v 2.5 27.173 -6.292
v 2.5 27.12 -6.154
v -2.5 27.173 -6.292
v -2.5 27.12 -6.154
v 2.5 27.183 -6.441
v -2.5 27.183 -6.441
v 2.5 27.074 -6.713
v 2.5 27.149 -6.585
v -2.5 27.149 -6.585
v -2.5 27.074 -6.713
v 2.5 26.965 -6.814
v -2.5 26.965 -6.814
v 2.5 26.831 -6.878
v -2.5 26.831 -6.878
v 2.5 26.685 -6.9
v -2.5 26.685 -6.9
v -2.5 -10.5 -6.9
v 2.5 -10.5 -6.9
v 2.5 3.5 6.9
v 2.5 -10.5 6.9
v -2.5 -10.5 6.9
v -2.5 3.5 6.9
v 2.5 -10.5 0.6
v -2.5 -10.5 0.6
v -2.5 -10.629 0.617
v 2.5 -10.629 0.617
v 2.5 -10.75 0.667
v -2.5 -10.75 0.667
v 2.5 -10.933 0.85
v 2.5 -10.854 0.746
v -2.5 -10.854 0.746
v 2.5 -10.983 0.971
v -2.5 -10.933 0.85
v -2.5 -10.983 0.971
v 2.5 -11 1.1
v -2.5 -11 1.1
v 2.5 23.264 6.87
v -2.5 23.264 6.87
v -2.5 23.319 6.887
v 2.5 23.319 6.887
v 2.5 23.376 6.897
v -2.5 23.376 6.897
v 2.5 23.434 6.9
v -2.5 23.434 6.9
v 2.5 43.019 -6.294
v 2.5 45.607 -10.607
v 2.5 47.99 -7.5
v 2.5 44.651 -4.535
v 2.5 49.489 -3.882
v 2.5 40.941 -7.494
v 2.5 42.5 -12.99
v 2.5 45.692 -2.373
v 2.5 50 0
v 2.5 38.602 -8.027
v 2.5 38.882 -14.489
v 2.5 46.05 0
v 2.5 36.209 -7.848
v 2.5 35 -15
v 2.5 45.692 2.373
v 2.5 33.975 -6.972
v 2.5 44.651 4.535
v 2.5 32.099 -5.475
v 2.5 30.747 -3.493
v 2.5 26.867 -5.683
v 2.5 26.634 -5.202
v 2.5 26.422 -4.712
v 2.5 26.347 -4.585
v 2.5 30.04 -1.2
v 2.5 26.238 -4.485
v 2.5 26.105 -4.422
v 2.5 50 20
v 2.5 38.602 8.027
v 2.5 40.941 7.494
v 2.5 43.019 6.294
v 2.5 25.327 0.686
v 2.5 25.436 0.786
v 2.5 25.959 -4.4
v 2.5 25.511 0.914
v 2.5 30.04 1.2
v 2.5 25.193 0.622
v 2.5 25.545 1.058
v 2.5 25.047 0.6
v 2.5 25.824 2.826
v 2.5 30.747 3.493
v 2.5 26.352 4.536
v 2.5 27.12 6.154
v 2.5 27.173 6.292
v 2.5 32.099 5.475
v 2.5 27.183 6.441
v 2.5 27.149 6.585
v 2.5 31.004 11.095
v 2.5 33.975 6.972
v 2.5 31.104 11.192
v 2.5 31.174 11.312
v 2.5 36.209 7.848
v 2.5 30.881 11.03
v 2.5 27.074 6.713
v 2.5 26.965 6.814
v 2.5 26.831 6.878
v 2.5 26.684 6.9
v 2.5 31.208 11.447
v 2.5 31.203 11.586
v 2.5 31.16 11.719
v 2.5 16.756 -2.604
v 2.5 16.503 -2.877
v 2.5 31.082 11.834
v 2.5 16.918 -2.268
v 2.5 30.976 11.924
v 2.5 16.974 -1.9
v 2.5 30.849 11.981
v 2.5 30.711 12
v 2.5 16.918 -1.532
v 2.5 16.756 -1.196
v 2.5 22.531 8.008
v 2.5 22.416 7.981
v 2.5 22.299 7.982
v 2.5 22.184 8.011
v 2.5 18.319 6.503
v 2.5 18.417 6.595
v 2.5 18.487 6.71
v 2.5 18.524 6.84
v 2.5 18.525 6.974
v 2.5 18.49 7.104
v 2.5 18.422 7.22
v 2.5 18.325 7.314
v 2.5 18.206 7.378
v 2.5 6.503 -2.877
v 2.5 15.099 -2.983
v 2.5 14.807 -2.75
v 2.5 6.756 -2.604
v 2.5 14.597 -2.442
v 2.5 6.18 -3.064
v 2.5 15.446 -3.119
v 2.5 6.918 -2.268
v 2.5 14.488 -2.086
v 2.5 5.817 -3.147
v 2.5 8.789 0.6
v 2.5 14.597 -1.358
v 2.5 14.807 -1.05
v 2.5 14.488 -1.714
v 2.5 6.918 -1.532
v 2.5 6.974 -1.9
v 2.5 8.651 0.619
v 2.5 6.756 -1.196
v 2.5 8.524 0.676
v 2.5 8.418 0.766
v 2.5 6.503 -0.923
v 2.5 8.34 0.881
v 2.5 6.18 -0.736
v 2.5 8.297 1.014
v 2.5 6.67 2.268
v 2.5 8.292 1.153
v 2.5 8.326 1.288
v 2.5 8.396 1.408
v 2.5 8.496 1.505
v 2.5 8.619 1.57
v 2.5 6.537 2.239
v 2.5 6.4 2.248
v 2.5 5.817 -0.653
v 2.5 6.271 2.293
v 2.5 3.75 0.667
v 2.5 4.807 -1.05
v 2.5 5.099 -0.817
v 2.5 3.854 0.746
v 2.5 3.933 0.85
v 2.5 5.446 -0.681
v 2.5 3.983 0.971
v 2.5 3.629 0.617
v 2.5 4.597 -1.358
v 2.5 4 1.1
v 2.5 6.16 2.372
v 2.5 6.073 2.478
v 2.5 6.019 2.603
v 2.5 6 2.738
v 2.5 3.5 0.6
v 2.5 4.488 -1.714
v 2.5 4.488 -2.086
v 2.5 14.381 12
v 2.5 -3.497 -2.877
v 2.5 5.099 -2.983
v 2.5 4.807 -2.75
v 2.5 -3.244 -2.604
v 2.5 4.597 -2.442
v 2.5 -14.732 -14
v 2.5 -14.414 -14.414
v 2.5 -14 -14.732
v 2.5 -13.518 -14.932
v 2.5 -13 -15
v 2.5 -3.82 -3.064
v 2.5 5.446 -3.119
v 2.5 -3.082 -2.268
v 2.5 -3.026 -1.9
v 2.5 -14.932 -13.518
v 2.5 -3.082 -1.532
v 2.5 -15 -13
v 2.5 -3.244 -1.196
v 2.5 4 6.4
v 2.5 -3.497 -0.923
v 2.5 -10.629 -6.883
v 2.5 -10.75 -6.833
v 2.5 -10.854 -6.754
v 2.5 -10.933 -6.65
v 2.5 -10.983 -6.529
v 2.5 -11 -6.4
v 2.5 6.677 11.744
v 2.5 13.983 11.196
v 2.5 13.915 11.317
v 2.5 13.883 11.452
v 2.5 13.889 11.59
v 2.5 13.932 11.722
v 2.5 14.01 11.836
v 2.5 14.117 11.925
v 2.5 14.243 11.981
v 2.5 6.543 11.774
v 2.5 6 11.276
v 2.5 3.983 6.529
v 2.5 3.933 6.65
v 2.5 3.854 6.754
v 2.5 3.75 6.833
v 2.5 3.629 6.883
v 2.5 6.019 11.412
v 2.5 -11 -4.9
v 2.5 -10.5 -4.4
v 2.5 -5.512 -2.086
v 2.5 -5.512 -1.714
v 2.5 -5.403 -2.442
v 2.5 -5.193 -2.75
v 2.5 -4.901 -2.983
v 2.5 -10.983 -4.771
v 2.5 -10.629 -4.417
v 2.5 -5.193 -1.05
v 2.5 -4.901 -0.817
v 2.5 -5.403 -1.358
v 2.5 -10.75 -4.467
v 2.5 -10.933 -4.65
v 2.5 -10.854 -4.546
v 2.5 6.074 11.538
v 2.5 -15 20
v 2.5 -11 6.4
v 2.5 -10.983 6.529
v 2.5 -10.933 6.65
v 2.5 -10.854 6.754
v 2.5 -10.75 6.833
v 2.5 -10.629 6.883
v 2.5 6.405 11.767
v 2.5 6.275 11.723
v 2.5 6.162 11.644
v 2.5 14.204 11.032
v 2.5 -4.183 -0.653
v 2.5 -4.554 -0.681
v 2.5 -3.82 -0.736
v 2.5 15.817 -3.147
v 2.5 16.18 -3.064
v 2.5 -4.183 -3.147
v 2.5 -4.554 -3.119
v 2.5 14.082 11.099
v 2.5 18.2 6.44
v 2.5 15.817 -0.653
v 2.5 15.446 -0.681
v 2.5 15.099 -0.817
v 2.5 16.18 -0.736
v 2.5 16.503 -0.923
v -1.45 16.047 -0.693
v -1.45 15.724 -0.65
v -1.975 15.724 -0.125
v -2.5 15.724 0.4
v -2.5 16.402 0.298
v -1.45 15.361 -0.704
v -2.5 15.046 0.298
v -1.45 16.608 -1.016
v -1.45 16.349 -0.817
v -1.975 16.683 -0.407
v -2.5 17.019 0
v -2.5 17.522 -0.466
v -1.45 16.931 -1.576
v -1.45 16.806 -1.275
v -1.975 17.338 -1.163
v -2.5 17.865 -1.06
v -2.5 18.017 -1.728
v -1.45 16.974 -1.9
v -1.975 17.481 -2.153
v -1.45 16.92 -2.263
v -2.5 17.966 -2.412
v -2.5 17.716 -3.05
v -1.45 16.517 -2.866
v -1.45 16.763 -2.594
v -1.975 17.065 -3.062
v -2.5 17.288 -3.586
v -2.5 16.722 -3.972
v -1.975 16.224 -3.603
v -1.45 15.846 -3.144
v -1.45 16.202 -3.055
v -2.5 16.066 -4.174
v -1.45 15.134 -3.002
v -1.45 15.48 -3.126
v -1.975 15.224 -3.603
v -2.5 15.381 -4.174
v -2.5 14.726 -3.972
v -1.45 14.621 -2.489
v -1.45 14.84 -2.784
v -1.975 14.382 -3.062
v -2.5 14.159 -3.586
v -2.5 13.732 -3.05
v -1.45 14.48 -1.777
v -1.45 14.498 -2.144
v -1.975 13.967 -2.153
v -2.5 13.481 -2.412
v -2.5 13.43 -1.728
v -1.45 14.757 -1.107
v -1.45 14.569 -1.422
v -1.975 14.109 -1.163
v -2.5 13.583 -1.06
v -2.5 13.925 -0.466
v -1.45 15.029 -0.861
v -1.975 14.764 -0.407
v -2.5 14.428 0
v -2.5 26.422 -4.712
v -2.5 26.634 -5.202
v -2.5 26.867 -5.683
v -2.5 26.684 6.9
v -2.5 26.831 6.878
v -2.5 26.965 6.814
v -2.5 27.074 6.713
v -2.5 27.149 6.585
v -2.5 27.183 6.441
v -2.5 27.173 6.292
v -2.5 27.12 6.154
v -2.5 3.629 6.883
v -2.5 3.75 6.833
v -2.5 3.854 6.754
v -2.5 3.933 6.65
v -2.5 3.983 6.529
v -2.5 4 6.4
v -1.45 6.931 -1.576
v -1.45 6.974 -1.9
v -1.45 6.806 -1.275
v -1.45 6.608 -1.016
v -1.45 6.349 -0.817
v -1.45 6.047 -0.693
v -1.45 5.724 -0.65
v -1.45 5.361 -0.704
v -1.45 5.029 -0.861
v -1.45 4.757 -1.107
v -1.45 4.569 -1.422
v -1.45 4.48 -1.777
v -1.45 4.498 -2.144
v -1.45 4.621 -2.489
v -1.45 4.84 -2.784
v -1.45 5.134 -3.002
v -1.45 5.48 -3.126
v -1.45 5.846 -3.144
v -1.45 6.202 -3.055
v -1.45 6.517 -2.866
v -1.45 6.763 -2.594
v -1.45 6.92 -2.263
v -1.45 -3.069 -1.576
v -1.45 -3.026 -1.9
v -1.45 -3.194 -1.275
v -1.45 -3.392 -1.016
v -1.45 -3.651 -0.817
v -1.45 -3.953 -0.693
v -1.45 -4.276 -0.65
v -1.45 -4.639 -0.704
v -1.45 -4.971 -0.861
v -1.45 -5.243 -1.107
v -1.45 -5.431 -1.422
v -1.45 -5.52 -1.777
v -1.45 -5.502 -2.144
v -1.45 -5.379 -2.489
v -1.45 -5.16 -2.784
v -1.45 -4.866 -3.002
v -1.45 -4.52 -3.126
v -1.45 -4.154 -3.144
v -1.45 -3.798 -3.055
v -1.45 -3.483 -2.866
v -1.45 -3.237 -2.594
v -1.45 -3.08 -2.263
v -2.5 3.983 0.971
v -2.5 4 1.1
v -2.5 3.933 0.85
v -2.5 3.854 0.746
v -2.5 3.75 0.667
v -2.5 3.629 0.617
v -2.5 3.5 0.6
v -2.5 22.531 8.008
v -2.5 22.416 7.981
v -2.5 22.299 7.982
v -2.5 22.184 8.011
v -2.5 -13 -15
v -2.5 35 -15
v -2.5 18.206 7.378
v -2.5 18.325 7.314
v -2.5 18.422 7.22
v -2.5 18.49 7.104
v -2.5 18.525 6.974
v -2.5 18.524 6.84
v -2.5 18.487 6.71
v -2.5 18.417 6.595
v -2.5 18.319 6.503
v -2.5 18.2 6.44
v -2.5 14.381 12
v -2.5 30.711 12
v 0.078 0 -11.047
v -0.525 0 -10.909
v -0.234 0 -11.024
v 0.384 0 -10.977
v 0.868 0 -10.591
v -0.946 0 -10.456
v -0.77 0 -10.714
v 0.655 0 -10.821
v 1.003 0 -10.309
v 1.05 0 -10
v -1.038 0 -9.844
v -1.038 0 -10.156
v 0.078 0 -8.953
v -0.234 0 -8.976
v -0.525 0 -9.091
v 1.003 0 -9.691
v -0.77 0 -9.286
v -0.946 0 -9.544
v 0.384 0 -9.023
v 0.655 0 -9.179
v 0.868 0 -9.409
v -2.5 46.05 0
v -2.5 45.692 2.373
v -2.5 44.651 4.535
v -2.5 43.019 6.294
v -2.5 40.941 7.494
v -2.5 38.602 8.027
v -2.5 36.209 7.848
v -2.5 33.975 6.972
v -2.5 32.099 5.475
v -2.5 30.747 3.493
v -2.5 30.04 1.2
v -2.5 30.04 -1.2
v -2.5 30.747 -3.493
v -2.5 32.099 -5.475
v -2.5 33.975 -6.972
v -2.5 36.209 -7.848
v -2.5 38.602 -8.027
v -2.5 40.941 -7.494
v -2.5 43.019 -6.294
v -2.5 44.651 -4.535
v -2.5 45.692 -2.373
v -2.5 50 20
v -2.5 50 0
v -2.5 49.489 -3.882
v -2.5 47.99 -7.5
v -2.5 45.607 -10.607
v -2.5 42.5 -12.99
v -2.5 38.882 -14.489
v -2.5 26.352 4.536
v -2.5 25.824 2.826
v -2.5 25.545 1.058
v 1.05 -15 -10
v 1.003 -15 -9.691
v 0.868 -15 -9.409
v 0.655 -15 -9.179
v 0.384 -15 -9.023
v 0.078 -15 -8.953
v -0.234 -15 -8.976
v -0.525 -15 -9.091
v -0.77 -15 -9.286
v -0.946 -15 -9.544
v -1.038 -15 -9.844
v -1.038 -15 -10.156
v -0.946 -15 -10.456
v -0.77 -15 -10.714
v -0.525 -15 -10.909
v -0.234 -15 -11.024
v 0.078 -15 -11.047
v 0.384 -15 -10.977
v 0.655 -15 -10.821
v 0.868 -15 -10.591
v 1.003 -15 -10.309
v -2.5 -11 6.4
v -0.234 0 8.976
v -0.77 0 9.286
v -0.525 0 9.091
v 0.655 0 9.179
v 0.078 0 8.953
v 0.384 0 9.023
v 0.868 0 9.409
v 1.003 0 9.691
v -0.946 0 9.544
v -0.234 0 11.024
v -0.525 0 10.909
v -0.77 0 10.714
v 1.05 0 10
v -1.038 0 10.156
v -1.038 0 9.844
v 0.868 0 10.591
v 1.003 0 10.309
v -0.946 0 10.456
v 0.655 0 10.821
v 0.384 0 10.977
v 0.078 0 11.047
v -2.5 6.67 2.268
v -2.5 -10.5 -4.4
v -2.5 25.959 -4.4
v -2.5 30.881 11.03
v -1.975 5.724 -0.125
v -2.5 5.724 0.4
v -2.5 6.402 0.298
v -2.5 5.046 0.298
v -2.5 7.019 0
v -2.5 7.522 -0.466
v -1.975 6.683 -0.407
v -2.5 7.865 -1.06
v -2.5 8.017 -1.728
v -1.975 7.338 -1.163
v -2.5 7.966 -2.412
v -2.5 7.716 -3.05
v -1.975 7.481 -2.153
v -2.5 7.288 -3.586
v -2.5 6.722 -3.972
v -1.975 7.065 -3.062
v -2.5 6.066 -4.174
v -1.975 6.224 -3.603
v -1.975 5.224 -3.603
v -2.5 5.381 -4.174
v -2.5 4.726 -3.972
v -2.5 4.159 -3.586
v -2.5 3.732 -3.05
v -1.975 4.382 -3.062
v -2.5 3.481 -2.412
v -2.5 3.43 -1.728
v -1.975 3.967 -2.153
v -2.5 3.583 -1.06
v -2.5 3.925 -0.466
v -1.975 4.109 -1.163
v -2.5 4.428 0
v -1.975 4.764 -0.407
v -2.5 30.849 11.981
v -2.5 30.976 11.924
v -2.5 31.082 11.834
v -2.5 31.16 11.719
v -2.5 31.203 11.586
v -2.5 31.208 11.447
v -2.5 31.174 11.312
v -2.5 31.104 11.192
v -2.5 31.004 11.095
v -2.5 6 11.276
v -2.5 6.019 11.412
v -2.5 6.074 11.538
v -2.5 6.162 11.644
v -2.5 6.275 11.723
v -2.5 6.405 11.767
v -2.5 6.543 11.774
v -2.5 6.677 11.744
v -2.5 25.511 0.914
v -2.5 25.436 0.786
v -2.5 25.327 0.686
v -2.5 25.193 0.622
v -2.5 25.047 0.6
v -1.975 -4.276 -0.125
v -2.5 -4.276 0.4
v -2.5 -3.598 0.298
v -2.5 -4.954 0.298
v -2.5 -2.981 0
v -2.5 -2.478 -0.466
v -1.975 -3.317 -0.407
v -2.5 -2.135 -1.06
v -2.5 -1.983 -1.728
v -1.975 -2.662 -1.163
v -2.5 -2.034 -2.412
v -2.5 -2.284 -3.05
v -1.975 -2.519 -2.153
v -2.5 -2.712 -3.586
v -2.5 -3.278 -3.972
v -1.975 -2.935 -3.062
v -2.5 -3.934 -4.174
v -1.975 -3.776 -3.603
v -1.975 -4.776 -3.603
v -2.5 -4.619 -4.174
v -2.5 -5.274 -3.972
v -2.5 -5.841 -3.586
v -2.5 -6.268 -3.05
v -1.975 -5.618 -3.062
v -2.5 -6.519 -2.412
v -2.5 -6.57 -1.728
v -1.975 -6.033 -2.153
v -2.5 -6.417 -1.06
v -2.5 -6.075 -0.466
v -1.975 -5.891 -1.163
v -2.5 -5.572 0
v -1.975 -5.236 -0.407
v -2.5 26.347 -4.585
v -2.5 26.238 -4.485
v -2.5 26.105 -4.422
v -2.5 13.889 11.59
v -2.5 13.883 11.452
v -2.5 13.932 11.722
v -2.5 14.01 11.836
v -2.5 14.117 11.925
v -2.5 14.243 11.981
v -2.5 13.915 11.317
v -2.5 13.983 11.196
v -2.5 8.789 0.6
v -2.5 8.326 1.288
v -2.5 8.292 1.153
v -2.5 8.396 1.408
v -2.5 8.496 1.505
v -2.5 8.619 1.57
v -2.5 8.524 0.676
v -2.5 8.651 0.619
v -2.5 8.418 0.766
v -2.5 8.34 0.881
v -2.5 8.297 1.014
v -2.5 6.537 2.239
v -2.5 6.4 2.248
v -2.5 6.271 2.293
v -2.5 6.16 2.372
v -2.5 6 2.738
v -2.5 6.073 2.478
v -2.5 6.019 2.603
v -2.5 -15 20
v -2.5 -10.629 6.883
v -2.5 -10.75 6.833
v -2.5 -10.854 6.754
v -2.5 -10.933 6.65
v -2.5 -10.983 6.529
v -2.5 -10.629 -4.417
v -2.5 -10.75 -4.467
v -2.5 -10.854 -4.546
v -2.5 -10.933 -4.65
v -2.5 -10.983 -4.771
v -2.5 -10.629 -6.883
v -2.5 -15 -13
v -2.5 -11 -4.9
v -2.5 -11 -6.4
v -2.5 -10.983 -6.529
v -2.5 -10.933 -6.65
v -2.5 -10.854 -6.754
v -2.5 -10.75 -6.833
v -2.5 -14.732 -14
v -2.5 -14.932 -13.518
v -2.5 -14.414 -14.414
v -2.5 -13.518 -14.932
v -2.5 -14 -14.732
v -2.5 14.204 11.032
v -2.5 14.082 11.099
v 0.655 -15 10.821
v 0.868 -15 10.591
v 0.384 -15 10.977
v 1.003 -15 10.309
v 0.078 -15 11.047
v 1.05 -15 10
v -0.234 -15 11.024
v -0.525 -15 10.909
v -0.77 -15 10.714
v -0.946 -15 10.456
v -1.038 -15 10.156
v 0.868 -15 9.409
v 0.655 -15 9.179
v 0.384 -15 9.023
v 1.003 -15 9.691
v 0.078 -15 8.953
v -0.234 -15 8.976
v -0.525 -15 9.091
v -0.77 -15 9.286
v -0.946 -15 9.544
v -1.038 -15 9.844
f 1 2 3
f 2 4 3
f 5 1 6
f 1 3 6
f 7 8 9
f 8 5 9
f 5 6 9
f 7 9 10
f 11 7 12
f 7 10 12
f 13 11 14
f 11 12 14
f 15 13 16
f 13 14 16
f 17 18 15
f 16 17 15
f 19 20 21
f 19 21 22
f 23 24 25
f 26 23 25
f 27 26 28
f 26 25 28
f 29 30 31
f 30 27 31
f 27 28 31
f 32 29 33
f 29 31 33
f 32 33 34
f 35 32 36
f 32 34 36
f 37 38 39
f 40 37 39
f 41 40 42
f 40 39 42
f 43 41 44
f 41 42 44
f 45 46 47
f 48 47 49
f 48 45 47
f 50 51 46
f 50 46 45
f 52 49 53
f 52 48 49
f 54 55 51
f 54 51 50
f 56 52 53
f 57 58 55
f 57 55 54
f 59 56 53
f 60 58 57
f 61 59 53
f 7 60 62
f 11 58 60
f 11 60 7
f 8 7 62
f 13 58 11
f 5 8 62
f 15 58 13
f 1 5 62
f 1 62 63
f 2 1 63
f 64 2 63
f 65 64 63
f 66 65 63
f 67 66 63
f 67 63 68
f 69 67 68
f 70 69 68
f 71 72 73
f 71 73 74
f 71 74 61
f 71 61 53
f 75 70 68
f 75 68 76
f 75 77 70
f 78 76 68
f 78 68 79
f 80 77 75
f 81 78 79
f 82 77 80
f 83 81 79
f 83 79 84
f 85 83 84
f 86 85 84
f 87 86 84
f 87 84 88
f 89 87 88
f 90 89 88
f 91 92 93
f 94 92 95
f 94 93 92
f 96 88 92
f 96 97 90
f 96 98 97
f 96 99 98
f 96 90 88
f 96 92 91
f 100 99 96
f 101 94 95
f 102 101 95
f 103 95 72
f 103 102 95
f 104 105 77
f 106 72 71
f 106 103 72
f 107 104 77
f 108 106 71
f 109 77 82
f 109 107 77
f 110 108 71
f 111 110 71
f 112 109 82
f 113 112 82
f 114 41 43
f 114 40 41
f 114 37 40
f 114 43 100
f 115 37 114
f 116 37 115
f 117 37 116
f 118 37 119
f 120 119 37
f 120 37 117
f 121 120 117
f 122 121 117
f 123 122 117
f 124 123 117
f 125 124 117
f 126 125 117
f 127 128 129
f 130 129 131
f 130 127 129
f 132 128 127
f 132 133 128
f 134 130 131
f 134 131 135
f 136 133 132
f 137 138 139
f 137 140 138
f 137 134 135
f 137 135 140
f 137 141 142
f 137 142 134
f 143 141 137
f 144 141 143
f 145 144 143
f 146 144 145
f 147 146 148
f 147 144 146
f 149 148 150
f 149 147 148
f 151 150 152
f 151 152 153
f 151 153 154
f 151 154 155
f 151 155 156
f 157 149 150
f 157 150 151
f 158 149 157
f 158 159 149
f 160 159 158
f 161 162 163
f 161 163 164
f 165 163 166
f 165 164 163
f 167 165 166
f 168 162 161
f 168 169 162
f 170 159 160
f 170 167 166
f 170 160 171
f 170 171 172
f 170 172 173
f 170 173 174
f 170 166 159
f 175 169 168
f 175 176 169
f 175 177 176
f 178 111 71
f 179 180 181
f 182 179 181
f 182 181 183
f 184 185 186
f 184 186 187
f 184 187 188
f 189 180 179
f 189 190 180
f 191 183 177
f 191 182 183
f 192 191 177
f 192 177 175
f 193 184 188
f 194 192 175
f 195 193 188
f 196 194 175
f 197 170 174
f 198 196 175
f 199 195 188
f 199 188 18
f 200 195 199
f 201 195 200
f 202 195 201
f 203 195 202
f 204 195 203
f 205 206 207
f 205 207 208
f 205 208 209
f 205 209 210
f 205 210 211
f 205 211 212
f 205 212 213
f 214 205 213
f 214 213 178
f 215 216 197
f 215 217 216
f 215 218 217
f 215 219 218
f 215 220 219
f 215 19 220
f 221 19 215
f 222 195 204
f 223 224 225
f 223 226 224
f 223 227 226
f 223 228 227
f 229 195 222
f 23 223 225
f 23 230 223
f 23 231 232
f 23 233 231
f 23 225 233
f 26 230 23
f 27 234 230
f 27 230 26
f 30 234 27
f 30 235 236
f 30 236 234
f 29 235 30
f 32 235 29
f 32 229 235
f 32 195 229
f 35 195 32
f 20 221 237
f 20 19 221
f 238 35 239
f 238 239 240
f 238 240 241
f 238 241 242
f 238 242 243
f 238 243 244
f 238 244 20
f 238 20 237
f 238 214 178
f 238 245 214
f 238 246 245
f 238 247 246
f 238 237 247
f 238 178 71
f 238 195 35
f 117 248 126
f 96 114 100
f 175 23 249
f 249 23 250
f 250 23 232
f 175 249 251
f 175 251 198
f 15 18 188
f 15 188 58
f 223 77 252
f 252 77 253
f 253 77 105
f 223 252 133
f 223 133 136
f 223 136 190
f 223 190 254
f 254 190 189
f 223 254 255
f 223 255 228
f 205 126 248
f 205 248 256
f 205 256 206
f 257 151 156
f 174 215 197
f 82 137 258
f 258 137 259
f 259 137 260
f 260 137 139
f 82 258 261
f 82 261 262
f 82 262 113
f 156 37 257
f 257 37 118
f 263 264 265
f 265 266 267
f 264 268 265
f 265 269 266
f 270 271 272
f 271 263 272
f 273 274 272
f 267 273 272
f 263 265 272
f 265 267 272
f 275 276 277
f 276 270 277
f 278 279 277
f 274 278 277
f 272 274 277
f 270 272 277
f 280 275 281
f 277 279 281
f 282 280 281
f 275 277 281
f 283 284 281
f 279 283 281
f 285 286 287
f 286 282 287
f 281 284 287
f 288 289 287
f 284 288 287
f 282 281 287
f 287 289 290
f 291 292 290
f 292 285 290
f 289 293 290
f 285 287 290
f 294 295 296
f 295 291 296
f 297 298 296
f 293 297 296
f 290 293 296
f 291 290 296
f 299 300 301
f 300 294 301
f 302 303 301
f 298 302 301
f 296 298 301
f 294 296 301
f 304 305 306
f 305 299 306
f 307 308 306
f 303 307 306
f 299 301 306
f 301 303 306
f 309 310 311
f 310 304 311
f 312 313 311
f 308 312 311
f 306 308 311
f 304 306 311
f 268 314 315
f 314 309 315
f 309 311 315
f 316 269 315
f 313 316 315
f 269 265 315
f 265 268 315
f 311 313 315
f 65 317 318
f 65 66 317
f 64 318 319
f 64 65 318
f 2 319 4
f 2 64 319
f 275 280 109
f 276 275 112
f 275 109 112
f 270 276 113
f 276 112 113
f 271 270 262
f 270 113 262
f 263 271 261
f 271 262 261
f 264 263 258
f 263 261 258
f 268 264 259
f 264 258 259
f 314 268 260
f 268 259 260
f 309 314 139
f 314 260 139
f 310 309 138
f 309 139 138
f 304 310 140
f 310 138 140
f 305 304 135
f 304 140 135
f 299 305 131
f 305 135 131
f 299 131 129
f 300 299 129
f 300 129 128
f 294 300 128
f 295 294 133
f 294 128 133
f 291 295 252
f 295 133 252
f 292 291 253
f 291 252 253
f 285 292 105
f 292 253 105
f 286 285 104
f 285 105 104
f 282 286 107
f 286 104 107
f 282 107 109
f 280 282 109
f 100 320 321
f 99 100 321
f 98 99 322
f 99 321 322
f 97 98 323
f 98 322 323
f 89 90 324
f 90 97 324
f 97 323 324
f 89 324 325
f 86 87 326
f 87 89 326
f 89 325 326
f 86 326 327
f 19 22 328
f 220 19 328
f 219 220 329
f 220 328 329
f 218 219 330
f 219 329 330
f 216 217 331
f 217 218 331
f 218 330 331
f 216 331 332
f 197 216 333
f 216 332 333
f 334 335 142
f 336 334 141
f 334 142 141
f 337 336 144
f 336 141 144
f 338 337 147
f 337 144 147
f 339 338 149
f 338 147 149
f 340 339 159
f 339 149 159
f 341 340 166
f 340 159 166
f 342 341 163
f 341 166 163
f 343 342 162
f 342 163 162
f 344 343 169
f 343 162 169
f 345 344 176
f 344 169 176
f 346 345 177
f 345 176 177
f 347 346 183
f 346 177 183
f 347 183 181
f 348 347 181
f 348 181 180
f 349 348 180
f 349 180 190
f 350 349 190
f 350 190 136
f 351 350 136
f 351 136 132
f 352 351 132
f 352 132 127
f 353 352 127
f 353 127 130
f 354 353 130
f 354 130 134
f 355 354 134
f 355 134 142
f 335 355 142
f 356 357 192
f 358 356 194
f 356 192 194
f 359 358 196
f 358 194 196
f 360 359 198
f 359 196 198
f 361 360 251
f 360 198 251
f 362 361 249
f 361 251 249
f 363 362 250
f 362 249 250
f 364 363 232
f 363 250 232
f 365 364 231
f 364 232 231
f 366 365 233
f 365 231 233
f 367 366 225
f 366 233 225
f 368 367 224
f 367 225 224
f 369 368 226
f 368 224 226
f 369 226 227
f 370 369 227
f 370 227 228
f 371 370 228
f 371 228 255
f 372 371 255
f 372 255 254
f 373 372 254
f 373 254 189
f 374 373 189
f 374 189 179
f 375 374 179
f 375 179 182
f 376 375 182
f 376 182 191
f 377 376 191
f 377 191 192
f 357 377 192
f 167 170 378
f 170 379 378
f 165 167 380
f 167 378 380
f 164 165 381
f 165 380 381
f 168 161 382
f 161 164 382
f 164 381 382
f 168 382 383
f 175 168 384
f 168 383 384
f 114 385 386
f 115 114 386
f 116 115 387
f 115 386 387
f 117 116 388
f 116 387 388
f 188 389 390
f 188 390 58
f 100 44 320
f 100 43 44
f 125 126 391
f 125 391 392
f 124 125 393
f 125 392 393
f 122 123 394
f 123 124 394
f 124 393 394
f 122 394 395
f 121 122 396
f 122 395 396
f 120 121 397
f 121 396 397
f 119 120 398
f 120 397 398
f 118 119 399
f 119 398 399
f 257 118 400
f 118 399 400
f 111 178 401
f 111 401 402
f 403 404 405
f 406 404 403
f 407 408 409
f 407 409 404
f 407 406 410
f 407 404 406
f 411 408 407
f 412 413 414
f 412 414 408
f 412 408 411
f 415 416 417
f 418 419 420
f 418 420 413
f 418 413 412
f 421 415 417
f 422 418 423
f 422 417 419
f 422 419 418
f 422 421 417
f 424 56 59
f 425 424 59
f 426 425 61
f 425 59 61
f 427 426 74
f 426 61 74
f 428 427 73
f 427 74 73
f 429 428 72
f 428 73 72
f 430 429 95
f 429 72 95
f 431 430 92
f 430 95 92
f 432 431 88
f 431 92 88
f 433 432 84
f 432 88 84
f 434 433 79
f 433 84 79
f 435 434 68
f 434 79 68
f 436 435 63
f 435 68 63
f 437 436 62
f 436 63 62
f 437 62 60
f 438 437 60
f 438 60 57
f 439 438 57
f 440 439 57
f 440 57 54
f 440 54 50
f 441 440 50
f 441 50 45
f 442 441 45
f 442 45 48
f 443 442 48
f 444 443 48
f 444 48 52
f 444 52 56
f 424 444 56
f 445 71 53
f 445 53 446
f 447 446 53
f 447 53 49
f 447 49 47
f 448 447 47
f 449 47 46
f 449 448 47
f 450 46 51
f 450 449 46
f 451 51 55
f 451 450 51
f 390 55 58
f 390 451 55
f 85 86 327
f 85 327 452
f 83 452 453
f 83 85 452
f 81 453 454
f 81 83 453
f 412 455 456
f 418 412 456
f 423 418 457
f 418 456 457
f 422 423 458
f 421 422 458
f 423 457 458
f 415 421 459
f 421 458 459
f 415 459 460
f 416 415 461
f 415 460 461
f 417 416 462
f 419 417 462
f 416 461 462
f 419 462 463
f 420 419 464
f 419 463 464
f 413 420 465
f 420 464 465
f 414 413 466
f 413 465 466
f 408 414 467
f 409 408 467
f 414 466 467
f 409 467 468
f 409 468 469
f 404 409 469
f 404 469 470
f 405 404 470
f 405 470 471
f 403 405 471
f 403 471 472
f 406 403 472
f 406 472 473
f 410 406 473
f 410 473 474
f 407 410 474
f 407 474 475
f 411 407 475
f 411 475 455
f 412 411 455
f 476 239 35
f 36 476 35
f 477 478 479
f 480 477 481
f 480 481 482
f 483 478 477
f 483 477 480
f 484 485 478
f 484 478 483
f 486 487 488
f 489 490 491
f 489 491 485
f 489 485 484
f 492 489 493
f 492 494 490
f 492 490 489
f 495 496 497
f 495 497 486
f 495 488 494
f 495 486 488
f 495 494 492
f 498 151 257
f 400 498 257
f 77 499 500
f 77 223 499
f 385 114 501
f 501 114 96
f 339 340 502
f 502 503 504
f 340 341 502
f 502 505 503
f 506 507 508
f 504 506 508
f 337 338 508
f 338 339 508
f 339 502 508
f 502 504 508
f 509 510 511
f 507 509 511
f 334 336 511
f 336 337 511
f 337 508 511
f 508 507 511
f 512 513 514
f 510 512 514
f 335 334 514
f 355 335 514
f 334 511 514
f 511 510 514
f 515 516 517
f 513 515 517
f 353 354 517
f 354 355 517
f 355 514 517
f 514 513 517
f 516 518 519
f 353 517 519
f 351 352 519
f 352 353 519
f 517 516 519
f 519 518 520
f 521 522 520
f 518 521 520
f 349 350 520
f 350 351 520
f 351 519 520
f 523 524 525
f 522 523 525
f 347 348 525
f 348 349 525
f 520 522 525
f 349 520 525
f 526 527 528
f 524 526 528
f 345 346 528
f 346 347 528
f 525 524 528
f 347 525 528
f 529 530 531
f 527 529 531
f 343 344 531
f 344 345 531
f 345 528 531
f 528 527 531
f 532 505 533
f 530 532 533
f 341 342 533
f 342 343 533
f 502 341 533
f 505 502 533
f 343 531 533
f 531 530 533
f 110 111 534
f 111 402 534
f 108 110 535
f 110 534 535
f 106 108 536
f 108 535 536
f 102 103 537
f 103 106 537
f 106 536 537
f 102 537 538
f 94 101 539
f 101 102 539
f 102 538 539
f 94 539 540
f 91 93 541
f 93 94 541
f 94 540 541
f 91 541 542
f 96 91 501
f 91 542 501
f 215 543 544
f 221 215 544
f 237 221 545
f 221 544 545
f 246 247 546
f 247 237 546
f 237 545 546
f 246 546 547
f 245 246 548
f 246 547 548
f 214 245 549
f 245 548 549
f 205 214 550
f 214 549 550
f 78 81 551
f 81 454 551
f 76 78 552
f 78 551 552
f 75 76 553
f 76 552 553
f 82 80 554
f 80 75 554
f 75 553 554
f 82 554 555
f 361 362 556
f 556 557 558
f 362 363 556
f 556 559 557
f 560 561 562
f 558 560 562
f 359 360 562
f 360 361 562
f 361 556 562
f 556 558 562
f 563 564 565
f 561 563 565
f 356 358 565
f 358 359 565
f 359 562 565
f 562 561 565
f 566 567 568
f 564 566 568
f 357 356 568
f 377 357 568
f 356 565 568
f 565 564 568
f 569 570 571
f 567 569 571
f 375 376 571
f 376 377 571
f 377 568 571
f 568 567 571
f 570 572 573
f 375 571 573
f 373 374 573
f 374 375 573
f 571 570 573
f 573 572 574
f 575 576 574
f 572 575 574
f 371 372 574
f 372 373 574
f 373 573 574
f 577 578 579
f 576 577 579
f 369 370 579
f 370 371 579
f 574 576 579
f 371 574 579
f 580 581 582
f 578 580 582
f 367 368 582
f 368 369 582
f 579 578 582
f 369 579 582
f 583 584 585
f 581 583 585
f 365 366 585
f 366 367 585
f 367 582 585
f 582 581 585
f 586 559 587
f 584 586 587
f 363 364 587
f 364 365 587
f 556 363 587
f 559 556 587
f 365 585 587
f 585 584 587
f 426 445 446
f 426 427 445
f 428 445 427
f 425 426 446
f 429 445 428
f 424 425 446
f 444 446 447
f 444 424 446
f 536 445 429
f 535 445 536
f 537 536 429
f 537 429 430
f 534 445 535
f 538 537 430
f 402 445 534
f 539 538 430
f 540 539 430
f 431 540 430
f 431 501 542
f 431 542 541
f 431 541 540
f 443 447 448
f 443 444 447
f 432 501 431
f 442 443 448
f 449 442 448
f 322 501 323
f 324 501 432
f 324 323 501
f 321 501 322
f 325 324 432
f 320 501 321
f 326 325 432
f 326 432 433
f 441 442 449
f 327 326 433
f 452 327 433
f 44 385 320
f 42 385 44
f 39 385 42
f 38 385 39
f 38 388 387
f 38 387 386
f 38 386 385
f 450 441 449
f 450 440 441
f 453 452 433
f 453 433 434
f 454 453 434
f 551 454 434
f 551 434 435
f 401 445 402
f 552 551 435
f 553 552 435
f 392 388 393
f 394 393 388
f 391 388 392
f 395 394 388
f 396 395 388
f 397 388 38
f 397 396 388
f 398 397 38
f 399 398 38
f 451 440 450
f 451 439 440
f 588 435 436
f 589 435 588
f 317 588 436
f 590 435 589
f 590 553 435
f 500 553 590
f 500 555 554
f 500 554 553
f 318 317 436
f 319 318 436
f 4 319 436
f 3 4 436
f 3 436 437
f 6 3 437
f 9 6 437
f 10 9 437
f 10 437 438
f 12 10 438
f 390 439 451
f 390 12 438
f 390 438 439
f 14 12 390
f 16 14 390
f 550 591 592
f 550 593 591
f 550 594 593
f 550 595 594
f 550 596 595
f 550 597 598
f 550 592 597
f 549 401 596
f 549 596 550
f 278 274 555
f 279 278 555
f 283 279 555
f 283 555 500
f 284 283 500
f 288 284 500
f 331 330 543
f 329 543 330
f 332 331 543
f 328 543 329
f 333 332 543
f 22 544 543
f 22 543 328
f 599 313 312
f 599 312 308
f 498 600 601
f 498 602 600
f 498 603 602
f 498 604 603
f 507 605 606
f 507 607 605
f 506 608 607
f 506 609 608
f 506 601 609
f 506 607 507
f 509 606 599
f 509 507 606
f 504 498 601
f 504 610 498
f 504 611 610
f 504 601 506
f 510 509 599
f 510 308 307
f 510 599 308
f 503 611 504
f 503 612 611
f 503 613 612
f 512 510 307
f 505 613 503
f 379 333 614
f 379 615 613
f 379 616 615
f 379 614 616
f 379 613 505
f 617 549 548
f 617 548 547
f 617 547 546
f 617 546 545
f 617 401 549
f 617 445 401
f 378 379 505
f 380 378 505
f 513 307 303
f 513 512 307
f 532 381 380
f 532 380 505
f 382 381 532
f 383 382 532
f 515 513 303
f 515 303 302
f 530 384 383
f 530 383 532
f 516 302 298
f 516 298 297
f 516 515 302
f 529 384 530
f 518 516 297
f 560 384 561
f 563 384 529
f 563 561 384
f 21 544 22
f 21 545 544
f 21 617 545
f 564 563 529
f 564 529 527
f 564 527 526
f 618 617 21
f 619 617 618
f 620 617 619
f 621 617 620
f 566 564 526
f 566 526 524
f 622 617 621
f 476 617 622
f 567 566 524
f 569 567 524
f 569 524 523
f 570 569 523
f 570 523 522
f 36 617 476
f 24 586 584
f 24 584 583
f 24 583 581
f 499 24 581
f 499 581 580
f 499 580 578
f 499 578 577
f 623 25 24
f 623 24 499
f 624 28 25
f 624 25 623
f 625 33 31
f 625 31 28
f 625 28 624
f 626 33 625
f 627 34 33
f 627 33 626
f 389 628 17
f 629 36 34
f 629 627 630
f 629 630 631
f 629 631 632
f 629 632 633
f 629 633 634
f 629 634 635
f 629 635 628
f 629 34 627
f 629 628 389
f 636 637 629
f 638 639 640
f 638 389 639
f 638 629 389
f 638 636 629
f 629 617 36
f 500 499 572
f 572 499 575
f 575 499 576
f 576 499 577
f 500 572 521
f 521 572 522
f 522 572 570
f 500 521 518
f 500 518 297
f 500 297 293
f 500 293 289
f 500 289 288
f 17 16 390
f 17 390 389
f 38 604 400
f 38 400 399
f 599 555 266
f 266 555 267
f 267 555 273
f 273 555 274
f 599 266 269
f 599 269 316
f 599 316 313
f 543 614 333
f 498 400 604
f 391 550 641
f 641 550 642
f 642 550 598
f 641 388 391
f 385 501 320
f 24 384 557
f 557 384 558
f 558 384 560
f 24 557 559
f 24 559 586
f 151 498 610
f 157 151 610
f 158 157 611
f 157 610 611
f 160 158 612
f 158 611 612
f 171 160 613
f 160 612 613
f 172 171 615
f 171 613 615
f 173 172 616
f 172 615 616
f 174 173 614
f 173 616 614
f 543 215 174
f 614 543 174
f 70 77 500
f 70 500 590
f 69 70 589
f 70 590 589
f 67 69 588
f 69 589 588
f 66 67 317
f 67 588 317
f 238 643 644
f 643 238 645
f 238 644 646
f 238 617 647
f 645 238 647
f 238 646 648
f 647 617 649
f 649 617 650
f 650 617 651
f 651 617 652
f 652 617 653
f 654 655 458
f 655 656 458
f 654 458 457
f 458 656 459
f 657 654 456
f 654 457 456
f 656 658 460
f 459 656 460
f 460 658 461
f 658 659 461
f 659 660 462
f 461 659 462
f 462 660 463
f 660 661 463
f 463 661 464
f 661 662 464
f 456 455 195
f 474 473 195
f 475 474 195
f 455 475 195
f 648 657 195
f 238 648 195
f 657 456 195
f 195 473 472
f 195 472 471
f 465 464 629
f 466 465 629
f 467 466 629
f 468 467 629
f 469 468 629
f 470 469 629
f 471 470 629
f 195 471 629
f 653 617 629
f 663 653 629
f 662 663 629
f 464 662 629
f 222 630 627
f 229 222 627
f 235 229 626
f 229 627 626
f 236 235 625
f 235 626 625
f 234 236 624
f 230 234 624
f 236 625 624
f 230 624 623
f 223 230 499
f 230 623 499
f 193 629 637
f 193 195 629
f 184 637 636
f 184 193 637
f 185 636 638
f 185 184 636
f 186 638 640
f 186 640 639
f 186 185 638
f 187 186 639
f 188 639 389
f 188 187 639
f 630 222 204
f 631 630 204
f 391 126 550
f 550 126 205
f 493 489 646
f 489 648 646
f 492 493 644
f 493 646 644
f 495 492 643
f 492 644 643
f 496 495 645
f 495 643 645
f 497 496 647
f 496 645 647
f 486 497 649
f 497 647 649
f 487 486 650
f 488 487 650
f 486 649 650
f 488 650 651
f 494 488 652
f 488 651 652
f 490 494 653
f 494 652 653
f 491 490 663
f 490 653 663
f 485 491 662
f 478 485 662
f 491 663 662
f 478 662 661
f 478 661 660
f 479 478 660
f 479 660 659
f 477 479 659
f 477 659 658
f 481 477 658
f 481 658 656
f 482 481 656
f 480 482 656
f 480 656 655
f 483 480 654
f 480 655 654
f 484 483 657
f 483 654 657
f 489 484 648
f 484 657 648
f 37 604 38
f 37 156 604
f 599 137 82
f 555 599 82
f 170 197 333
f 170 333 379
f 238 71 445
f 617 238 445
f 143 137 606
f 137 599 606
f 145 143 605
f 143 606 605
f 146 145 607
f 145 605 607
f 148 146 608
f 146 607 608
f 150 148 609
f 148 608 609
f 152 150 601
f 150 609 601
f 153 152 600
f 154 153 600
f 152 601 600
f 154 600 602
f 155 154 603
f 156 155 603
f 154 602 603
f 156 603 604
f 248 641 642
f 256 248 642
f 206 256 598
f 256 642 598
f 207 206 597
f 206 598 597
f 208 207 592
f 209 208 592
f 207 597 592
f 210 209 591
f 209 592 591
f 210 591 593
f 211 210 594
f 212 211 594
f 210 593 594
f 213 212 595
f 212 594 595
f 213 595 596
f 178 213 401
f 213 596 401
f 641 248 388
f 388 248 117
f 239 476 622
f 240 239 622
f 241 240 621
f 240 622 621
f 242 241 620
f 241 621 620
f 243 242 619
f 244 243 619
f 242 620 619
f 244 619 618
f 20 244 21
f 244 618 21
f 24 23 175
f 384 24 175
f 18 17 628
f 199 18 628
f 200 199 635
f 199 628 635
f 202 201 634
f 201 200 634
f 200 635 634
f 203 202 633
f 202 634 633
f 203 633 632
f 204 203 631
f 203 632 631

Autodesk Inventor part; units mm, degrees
ref_plane "YZ Plane" through (0, 0, 0) normal (1, 0, 0) x (0, 1, 0)
ref_plane "XZ Plane" through (0, 0, 0) normal (0, 1, 0) x (-1, 0, 0)
ref_plane "XY Plane" through (0, 0, 0) normal (0, 0, 1) x (1, 0, 0)
sketch "Boceto1" plane through (0, 0, 0) normal (0, 1, 0) x (-1, 0, 0)
  line L0 (-2.5, 20) -> (2.5, 20)
  line L1 (2.5, 20) -> (2.5, -15)
  line L2 (2.5, -15) -> (-2.5, -15)
  line L3 (-2.5, -15) -> (-2.5, 20)
  line L4 (0, 20) -> (0, -15)
  line L5 (-2.5, 2.5) -> (2.5, 2.5)
  point P0 (0, 0)
  point P1 (0, 2.5)
  dimension "d0" = 5
  dimension "d1" = 35
  dimension "d26" = 20
extrude "Main Body" add sketch "Boceto1" along normal mid plane 100
sketch "Axles" plane through (0, 0, 0) normal (1, 0, 0) x (0, 1, 0)
  line L0 (50, 20) -> (-50, 20) projected
  circle A0 centre (38, 0) radius 8.05
  circle A1 centre (-40, 0) radius 6.5
  point P0 (0, 0)
  dimension "d53" = 5
  dimension "d55" = 13
  dimension "d11" = 20
  dimension "d12" = 40
  dimension "d13" = 38
  dimension "d14" = 20
  dimension "d22" = 16.1
  dimension "d23" = 13
extrude "Bearings" cut sketch "Axles" along normal mid plane 100
sketch "Boceto4" plane through (0, 0, 0) normal (1, 0, 0) x (0, 1, 0)
  line L0 (-50.2028, -2.5) -> (5.4434, -2.5)
  line L1 (-50, -15) -> (-50, 20) projected
  line L2 (-50, 7.0921) -> (-15, 7.0921)
  line L3 (-15, 7.0921) -> (-15, -12.9079)
  line L4 (-15, -12.9079) -> (-50, -12.9079)
  line L5 (-50, -12.9079) -> (-50, 7.0921)
  point P0 (0, 0)
  dimension "d27" = 20
  dimension "d28" = 35
sketch "Boceto5" plane through (0, 0, 0) normal (1, 0, 0) x (0, 1, 0)
  line L0 (-50, 25.8088) -> (-15, 25.8088)
  line L1 (-15, 25.8088) -> (-15, -24.1912)
  line L2 (-15, -24.1912) -> (-50, -24.1912)
  line L3 (-50, -24.1912) -> (-50, 25.8088)
  point P0 (0, 0)
  point P1 (-50, 20)
  dimension "d29" = 35
  dimension "d56" = 50
extrude "Spring_support_space" cut sketch "Boceto5" along normal mid plane 10
sketch "Boceto6" plane through (-2.5, -15, 20) normal (0, -1, 0) x (1, 0, 0)
  line L0 (2.5, -16) -> (2.5, -24)
  line L1 (-2.5, -6.5) -> (-2.5, 6.5)
  line L2 (2.5, -20) -> (23.3777, -20)
  line L3 (2.5, 18.3522) -> (2.5, -26.5488)
  circle A0 centre (2.5, -10) radius 1.05
  circle A1 centre (2.5, -30) radius 1.05
  line L4 (0, 0) -> (5, 0) projected
  line L5 (0, 0) -> (5, 0) projected
  line L6 (0, -28.05) -> (0, -11.95) projected
  line L7 (5, -11.95) -> (5, -28.05) projected
  line L8 (0, -28.05) -> (5, -28.05) projected
  line L9 (0, -11.95) -> (5, -11.95) projected
  point P0 (2.5, 0)
  point P1 (0, -20)
  dimension "d35" = 2.1
  dimension "d36" = 20
extrude "Holes" cut sketch "Boceto6" against normal blind 15 contours A0 L3 | L3 A0 | A1
sketch "Boceto10" plane through (-2.5, -15, 20) normal (0, -1, 0) x (1, 0, 0)
  circle A0 centre (2.5, -10) radius 1.05 projected
  circle A1 centre (2.5, -30) radius 1.05 projected
  circle A2 centre (2.5, -10) radius 3.5
  line L0 (-5.1427, -20) -> (9.8665, -20)
  circle A3 centre (2.5, -30) radius 3.5
  point P0 (2.5, -20)
  dimension "d59" = 7
fillet "Edges" radius 15 1 edges at (0, 50, -15)
fillet "Edges" radius 2 1 edges at (0, -15, -15)
sketch "Boceto7" plane through (0, 0, 0) normal (1, 0, 0) x (0, 1, 0)
  line L0 (-15, -15) -> (-15, 20) projected
  line L1 (-50, 20) -> (50, 20) projected
  circle A0 centre (-8.5, 17) radius 1.2
  point P0 (0, 0)
  point P1 (45, 20)
  point P2 (-15, 15.1502)
  dimension "d41" = 6.5
  dimension "d42" = 3
  dimension "d50" = 2.4
extrude "Extrusión6" [suppressed]
pattern_linear "Patrón rectangular1" [suppressed]
sketch "Boceto8" plane through (0, 0, 0) normal (1, 0, 0) x (0, 1, 0)
  circle A0 centre (-4.2763, -1.9) radius 1.25 projected
  circle A1 centre (5.7237, -1.9) radius 1.25 projected
  circle A2 centre (15.7237, -1.9) radius 1.25 projected
  point P0 (0, 0)
extrude "Extrusión7" cut sketch "Boceto8" against normal up to surface (5 mm away) from surface at 2.5
sketch "Boceto11" plane through (2.5, -15, 20) normal (1, 0, 0) x (0, 0, -1)
  circle A0 centre (21.9, 10.7237) radius 1.25 projected
  circle A1 centre (21.9, 20.7237) radius 1.25 projected
  circle A2 centre (21.9, 30.7237) radius 1.25 projected
  line L0 (11.05, 0) -> (8.95, 0) projected
  line L1 (11.05, 15) -> (8.95, 15) projected
  line L2 (31.05, 0) -> (28.95, 0) projected
  line L3 (31.05, 15) -> (28.95, 15) projected
  line L4 (31.05, 0) -> (28.95, 0) projected
  line L5 (0, 0) -> (33, 0) projected
  circle A3 centre (20, 53) radius 8.05 projected
  line L6 (0, 65) -> (0, 0) projected
  line L7 (24.4, 19) -> (26.9, 19)
  line L8 (19.4, 20.9385) -> (19.4, 41.0847)
  line L9 (18.3253, 20) -> (18.3311, 20.0149)
  line L10 (20.4689, 19.9851) -> (20.4635, 20)
  line L11 (19.4, 20.9385) -> (13.1, 38.3464)
  arc A4 (13.1, 42.5769) -> (19.4, 40.5144) centre (20, 53) ccw
  arc A5 (24.4, 41.3) -> (26.9, 42.5769) centre (20, 53) ccw
  line L12 (13.1, 38.3464) -> (13.1, 42.5769)
  line L13 (24.4, 19) -> (24.4, 41.3)
  line L14 (26.9, 19) -> (26.9, 42.5769)
  line L15 (24.4, 19) -> (26.9, 19)
  line L16 (13.1, 4) -> (13.1, 19)
  line L17 (13.1, 34.4694) -> (8, 21)
  line L18 (8, 26.6481) -> (12.0549, 37.3572)
  line L19 (17.9746, 21) -> (13.1, 34.4694)
  line L20 (12.0549, 37.3572) -> (8, 48.5615)
  line L21 (8, 26.6481) -> (8, 48.5615)
  line L22 (13.1, 4) -> (19.4, 4)
  line L23 (24.4, 4) -> (26.9, 4)
  line L24 (24.4, 4) -> (24.4, 19)
  line L25 (26.9, 4) -> (26.9, 19)
  line L26 (19.4, 4) -> (19.4, 19)
  line L27 (13.1, 19) -> (19.4, 19)
  line L28 (8, 21) -> (17.9746, 21)
  point P0 (20, 15)
  point P1 (27.1716, 0)
extrude "Extrusión9" cut sketch "Boceto11" against normal blind 10 contours L13 A5 L14 L7 | L7 L25 L23 L24 | L11 L12 A4 L8 | L16 L27 L26 L22 | L19 L28 L17 | L21 L20 L18
extrude "Extrusión10" [suppressed]
fillet "Empalme2" radius 0.5 18 edges at (0, 6, 2.0254) (0, 19.4694, 6.9) (0, 6, 12) (0, 22.3572, 7.9451) (0, 33.5615, 12) (0, 11.6481, 12) (0, -11, 0.6) (0, 4, 6.9) (0, -11, -6.9) (0, -11, -4.4) (0, 27.5769, -6.9) (0, 26.3, -4.4) (0, 25.5144, 0.6) (0, 27.5769, 6.9) (0, 23.3464, 6.9) (0, 5.9385, 0.6) (0, -11, 6.9) (0, 4, 0.6)
sketch "Boceto13" plane through (-2.5, -15, 20) normal (-1, 0, 0) x (0, 0, 1)
  circle A0 centre (-3, 58.5) radius 1.2 projected
  circle A1 centre (-3, 45.5) radius 1.2 projected
  circle A2 centre (-3, 32.5) radius 1.2 projected
  circle A3 centre (-3, 19.5) radius 1.2 projected
  circle A4 centre (-3, 6.5) radius 1.2 projected
  circle A5 centre (-21.9, 10.7237) radius 1.25 projected
  circle A6 centre (-21.9, 20.7237) radius 1.25 projected
  circle A7 centre (-21.9, 30.7237) radius 1.25 projected
  point P0 (-20, 15)
hole "Agujero4" at (-2.5, -4.2763, -1.9) at (-2.5, 5.7237, -1.9) at (-2.5, 15.7237, -1.9) direction (1, 0, 0) diameter 2.4 end through all countersink diameter 4.6 countersink angle 90
properties part number "support_caterpillar_lateral_v3_Right" material "Plástico ABS"
